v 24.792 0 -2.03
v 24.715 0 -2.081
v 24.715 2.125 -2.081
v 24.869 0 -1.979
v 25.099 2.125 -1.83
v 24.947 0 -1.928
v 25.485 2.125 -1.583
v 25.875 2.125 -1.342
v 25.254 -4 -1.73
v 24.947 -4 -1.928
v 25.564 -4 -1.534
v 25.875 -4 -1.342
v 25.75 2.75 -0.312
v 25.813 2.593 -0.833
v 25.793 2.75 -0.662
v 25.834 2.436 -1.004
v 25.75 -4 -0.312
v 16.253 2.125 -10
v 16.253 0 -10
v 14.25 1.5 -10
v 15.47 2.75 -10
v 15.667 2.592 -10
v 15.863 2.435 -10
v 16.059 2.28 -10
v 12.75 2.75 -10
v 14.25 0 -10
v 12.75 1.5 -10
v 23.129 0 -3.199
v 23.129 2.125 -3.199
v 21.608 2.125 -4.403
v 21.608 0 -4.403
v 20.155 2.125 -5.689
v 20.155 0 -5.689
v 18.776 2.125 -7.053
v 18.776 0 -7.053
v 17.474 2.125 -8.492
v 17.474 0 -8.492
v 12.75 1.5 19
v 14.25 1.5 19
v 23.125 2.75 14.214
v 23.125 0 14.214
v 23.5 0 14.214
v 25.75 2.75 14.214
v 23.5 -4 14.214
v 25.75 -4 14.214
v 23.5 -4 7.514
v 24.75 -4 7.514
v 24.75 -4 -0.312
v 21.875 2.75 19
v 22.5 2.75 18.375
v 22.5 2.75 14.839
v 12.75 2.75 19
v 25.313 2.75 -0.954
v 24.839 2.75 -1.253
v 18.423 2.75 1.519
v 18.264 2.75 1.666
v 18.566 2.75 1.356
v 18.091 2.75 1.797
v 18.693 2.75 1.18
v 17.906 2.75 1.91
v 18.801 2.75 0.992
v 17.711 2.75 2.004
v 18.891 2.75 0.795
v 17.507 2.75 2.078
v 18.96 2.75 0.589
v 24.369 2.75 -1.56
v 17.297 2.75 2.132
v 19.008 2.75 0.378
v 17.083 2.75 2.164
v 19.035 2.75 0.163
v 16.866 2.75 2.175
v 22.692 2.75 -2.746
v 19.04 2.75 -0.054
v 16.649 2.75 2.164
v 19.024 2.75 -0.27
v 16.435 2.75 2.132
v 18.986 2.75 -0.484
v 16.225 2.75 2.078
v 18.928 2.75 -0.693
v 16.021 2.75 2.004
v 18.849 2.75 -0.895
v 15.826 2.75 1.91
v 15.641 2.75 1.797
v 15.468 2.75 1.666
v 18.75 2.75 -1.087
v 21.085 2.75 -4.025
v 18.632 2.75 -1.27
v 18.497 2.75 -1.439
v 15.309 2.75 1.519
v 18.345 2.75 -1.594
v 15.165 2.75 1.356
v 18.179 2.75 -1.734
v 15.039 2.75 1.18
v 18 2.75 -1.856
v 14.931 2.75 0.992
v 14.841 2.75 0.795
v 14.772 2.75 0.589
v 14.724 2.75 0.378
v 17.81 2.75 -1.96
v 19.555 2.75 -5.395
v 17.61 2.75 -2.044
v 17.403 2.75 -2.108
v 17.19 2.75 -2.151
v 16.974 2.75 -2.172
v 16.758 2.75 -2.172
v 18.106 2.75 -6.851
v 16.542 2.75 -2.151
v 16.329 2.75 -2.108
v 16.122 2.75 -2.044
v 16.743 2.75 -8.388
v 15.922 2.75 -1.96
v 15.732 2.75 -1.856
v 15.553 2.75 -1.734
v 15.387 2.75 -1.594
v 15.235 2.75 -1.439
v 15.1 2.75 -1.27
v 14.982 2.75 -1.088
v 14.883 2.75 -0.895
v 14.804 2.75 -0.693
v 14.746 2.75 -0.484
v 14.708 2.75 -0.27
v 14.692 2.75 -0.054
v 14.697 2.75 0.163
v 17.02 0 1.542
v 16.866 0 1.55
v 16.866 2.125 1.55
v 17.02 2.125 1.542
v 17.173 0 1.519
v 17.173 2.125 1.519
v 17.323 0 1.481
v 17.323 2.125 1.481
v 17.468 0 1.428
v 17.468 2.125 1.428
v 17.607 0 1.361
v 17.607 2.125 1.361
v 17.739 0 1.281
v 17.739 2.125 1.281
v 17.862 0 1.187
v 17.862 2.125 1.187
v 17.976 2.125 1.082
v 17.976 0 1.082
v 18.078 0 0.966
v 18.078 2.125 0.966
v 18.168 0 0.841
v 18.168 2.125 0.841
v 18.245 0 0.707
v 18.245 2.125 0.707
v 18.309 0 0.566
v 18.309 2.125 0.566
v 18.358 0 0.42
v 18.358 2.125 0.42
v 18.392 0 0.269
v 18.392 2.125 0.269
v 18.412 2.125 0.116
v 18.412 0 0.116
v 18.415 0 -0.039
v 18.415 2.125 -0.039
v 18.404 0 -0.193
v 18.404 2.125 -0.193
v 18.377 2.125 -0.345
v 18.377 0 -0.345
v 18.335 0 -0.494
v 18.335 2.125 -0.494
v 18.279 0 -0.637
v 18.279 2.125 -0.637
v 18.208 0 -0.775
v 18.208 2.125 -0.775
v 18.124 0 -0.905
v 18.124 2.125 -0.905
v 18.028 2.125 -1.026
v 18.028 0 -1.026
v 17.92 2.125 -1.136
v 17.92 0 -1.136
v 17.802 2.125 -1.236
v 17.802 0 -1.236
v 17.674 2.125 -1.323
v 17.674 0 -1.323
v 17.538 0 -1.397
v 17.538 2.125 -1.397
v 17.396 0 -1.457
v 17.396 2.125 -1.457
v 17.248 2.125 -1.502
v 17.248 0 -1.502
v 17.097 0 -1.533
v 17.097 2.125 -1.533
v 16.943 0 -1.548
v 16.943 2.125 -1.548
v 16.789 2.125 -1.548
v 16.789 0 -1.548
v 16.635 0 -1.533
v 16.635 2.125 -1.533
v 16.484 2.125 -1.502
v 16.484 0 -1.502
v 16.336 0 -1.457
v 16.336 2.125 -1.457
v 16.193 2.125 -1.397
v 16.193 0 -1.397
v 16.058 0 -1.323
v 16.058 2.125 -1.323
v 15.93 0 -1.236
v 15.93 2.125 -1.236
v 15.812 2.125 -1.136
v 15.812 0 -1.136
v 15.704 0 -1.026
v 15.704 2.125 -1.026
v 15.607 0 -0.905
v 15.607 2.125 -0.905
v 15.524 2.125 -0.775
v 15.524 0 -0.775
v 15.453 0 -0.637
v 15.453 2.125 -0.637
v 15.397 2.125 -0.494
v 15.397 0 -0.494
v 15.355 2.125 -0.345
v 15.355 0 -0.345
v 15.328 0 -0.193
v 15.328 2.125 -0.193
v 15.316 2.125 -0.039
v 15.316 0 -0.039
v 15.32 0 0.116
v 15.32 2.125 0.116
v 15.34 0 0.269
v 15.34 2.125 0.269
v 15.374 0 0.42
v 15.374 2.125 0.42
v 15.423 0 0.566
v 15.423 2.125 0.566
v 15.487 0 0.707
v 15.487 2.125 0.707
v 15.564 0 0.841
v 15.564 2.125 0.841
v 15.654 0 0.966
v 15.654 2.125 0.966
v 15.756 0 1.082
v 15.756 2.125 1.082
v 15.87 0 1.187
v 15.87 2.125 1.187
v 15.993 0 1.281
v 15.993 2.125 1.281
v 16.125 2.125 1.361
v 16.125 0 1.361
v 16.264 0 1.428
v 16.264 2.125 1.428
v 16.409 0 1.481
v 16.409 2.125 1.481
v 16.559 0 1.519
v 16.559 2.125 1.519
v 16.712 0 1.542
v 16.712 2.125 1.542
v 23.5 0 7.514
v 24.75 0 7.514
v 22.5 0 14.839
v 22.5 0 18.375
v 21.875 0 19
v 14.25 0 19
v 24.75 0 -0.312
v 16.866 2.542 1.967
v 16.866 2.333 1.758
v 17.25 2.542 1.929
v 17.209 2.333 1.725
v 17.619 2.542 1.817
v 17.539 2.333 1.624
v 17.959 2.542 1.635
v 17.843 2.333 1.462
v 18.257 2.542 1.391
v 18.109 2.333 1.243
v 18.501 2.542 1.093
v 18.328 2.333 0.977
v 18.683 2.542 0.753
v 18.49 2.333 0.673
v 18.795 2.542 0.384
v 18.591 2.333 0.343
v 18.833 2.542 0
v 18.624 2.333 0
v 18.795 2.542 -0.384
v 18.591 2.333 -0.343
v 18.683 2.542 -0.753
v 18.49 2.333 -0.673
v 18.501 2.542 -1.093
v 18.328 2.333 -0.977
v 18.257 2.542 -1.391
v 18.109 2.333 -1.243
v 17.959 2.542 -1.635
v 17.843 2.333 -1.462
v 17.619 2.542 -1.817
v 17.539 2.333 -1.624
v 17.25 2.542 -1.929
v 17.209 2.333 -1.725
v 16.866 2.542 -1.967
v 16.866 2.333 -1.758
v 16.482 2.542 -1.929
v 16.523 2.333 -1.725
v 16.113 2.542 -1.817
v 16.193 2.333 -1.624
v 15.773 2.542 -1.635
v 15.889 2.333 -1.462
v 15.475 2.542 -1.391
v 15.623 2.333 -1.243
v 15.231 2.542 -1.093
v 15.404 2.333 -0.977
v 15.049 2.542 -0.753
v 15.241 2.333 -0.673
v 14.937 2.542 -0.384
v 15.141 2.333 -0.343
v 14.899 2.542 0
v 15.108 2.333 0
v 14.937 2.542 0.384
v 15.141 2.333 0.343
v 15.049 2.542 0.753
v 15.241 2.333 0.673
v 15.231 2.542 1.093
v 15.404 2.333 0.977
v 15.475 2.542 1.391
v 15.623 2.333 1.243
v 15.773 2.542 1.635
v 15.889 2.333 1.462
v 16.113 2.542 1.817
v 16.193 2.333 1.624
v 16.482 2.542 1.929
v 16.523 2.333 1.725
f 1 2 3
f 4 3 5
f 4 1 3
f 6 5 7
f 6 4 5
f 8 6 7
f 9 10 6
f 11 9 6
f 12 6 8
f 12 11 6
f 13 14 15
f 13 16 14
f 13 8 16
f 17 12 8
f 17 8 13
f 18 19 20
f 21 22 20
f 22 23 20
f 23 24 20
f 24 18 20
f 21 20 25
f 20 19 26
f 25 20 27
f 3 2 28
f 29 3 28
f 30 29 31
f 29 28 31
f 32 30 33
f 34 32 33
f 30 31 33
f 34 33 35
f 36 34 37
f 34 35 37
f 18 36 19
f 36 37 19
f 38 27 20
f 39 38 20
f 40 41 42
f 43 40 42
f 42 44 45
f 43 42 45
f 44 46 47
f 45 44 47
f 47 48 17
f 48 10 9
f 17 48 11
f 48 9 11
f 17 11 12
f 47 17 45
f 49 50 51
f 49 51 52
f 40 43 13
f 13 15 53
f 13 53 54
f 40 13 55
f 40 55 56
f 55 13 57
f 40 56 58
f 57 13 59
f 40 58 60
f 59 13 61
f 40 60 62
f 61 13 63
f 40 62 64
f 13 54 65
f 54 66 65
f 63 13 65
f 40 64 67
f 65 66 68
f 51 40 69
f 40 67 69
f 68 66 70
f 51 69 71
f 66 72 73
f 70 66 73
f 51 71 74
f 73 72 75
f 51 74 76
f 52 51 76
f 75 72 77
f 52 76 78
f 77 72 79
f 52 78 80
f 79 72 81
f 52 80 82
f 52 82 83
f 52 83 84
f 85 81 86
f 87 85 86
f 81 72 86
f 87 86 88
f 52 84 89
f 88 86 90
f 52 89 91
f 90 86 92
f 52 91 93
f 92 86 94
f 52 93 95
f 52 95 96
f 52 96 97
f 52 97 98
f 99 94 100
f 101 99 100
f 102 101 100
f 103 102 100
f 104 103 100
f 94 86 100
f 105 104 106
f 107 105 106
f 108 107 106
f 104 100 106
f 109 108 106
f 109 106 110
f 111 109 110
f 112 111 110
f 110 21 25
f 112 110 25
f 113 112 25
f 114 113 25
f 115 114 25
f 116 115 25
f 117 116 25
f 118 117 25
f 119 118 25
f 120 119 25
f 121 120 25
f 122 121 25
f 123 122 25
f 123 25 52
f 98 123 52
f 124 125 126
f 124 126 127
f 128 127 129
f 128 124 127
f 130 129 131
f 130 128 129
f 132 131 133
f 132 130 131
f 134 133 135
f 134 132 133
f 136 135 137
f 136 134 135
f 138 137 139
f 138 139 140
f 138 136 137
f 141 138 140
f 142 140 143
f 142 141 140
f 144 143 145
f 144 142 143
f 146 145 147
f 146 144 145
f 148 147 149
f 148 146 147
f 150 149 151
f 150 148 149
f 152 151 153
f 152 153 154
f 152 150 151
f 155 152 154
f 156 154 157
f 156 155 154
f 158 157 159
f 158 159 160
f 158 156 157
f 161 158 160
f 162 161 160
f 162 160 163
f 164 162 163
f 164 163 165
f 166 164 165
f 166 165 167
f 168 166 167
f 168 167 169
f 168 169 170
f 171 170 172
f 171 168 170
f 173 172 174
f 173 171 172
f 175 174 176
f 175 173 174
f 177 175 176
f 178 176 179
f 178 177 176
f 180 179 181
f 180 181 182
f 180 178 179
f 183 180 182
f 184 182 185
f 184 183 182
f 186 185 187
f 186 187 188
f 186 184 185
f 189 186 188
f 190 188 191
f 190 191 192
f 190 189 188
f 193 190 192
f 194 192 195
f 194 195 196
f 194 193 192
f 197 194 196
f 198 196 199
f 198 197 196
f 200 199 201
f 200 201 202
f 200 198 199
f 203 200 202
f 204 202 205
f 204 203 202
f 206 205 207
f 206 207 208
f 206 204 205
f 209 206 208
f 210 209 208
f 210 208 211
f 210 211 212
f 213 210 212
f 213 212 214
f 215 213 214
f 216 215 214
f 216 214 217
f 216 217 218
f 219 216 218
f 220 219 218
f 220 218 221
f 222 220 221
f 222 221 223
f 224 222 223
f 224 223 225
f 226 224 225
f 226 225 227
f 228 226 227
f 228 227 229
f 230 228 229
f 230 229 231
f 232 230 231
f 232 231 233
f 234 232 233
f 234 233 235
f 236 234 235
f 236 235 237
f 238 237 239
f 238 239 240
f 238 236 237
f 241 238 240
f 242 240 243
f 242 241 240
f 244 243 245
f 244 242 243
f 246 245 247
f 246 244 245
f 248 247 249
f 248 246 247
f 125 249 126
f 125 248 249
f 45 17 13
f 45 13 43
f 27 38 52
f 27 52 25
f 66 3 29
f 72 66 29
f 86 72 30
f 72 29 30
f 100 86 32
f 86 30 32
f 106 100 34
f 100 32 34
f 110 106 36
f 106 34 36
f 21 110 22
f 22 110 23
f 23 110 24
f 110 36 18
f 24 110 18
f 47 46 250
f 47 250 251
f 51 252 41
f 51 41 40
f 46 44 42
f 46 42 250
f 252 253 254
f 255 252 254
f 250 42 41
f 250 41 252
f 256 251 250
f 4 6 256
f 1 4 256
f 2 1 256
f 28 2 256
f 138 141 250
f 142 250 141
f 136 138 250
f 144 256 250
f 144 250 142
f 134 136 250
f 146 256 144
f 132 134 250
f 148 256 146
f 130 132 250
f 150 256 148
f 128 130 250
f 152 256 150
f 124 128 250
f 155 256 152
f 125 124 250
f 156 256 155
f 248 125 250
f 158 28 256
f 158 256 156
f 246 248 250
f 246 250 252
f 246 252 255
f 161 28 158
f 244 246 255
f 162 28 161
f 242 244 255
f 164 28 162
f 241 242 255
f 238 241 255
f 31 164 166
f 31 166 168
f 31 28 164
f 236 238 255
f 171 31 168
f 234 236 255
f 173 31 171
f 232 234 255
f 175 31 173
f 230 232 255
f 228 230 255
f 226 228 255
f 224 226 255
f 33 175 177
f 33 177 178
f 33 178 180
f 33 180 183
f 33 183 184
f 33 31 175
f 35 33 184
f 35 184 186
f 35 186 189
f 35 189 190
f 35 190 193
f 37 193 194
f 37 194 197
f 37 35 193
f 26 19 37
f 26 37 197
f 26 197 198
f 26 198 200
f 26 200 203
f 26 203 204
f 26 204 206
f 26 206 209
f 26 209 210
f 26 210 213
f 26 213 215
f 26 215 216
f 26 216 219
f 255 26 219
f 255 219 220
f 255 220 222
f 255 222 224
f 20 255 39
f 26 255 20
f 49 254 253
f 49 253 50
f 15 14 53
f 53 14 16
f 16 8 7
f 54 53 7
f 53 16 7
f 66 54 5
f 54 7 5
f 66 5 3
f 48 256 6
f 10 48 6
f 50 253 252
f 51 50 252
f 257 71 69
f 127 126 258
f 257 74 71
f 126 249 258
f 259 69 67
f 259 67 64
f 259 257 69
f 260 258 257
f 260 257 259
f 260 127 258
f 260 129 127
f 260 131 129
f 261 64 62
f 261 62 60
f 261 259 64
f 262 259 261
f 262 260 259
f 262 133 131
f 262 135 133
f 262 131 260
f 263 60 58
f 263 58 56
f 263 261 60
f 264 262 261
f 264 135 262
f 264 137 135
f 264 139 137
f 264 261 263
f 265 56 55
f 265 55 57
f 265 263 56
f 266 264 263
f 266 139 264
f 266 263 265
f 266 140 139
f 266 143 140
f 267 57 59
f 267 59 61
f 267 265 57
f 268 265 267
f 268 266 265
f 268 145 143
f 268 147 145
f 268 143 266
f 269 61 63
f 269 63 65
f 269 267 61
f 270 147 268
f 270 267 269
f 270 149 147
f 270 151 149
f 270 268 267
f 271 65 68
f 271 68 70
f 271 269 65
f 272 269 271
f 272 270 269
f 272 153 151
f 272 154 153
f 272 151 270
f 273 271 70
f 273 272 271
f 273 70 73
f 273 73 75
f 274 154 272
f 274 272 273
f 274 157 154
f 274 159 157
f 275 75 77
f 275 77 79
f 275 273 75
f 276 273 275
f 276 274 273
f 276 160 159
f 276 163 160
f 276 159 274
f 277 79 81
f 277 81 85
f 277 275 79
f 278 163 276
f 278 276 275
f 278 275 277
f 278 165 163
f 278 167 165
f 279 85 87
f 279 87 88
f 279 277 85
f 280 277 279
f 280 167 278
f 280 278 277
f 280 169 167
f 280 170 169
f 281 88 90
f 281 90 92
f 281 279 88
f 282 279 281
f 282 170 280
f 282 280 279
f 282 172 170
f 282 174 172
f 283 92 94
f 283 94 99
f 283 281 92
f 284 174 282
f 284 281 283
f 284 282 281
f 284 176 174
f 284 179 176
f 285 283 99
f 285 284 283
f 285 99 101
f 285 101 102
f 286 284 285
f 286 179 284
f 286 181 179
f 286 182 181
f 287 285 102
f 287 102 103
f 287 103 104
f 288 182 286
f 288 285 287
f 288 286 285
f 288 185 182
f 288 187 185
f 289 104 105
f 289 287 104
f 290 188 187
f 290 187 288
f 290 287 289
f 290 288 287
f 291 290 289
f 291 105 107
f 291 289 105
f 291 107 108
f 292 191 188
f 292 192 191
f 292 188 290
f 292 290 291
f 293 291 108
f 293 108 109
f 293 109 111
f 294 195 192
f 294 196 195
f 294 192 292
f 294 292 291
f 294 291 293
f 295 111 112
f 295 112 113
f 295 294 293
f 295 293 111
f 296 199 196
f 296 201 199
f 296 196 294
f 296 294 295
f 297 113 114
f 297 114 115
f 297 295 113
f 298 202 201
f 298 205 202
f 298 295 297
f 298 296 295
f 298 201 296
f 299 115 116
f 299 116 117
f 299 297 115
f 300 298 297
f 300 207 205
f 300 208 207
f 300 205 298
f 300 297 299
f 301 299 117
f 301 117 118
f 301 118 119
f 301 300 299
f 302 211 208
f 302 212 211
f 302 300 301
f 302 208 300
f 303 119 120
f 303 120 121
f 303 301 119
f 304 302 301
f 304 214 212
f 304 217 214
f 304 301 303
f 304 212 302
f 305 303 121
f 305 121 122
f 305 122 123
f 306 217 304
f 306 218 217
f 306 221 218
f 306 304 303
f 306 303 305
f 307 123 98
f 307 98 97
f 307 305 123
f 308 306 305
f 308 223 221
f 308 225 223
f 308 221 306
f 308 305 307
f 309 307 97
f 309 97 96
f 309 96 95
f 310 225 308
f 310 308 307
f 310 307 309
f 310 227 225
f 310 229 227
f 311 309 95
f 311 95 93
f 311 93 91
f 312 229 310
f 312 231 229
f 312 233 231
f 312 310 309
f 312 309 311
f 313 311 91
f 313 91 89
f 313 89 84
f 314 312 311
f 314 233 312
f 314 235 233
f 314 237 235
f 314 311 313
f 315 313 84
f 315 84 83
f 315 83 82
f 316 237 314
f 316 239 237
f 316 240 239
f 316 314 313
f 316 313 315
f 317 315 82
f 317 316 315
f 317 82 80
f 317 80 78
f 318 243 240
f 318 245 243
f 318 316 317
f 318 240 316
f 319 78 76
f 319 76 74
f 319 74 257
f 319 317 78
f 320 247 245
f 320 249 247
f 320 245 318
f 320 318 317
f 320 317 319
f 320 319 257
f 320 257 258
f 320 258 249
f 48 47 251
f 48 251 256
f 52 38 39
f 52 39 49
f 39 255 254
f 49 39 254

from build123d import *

# Parameters (mm, degrees)
SKETCH_219_R           = 1.55
EXTRUDE_1_DEPTH        = 2.75
SKETCH_940_W           = 10.000000002
SKETCH_940_H           = 4.75
EXTRUDE_2_DEPTH        = 2.75
SKETCH_1087_W          = 1
SKETCH_1087_H          = 6.95
EXTRUDE_1846_DEPTH     = 2.75
PCB_START              = -4
SKETCH_6_W             = 1
SKETCH_6_H             = 6.95
PCB_DEPTH              = 4
SKETCH_4_W             = 1.75
SKETCH_4_H             = 28.99988509
CUT_EXTRUDE_2332_DEPTH = 1.5
SKETCH_5_W             = 0.25
SKETCH_5_H             = 28.99988509
CUT_EXTRUDE_2_DEPTH    = 33.350081892
CHAMFER_1_SIZE         = 0.625
CUT_EXTRUDE_4_DEPTH    = 4


with BuildPart() as part:
    # Sketch 219 → 底座-1 (new body)
    with BuildSketch(Plane(origin=(0, 0, 0), x_dir=(1, 0, 0), z_dir=(0, 1, 0))):
        with BuildLine():
            Line((22.500000002, -14.24988509), (22.500000002, -7.263629174))
            Line((22.500000002, -7.263629174), (24.500000002, -7.263629174))
            Line((24.500000002, -7.263629174), (24.500000002, 0.312480077))
            Line((24.500000002, 0.312480077), (24.715186194, 2.08073674))
            ThreePointArc((24.715186194, 2.08073674), (20.15501929, 5.688743466), (16.252981126, 10))
            Line((16.252981126, 10), (12.5, 10))
            Line((12.5, 10), (12.5, -14.24988509))
            Line((12.5, -14.24988509), (22.500000002, -14.24988509))
        make_face()
        with Locations(Location((16.865979255, 0, 0), (0, 0, 270))):
            Circle(SKETCH_219_R, mode=Mode.SUBTRACT)
    extrude(amount=EXTRUDE_1_DEPTH)

    # Sketch 940 → 底座-2 (add)
    with BuildSketch(Plane(origin=(0, 0, 0), x_dir=(1, 0, 0), z_dir=(0, 1, 0))):
        with Locations((17.500000001, -16.62488509)):
            Rectangle(SKETCH_940_W, SKETCH_940_H)
    extrude(amount=EXTRUDE_2_DEPTH)

    # Sketch 1087 → Extrude 1846 (add)
    with BuildSketch(Plane(origin=(0, 0, 0), x_dir=(1, 0, 0), z_dir=(0, 1, 0))):
        with BuildLine():
            ThreePointArc((24.715186194, 2.08073674), (25.291636518, 1.705823535), (25.875319612, 1.342273079))
            Line((25.875319612, 1.342273079), (25.750000002, 0.312480077))
            Line((25.750000002, 0.312480077), (25.750000002, -14.213629174))
            Line((25.750000002, -14.213629174), (24.500000002, -14.213629174))
            Line((24.500000002, -14.213629174), (24.500000002, -7.263629174))
            Line((24.500000002, -7.263629174), (24.500000002, 0.312480077))
            Line((24.500000002, 0.312480077), (24.715186194, 2.08073674))
        make_face()
        with Locations((24.000000002, -10.738629174)):
            Rectangle(SKETCH_1087_W, SKETCH_1087_H)
        with Locations((23.000000002, -10.738629174)):
            Rectangle(SKETCH_1087_W, SKETCH_1087_H)
    extrude(amount=EXTRUDE_1846_DEPTH)

    # Sketch 6 → 底座卡榫-注意PCB突出部分 (add)
    with BuildSketch(Plane(origin=(0, 0, 0), x_dir=(1, 0, 0), z_dir=(0, 1, 0)).offset(PCB_START)):
        with Locations((24.000000002, -10.738629174)):
            Rectangle(SKETCH_6_W, SKETCH_6_H)
        with BuildLine():
            ThreePointArc((24.715186194, 2.08073674), (25.291636518, 1.705823535), (25.875319612, 1.342273079))
            Line((25.875319612, 1.342273079), (25.750000002, 0.312480077))
            Line((25.750000002, 0.312480077), (25.750000002, -14.213629174))
            Line((25.750000002, -14.213629174), (24.500000002, -14.213629174))
            Line((24.500000002, -14.213629174), (24.500000002, -7.263629174))
            Line((24.500000002, -7.263629174), (24.500000002, 0.312480077))
            Line((24.500000002, 0.312480077), (24.715186194, 2.08073674))
        make_face()
    extrude(amount=PCB_DEPTH)

    # 草图4 → Cut-Extrude 2332 (cut)
    with BuildSketch(Plane(origin=(0, 0, 0), x_dir=(1, 0, 0), z_dir=(0, 1, 0))):
        with Locations((13.375, -4.499942545)):
            Rectangle(SKETCH_4_W, SKETCH_4_H)
    extrude(amount=CUT_EXTRUDE_2332_DEPTH, mode=Mode.SUBTRACT)

    # 草图5 → 配合切除-2 (cut, through all)
    with BuildSketch(Plane(origin=(0, 0, 0), x_dir=(1, 0, 0), z_dir=(0, 1, 0))):
        with Locations((12.625, -4.499942545)):
            Rectangle(SKETCH_5_W, SKETCH_5_H)
    extrude(amount=CUT_EXTRUDE_2_DEPTH, mode=Mode.SUBTRACT)

    # 倒角1
    chamfer_1_edges = [part.edges().sort_by_distance(p)[0] for p in [
        (22.500000002, 1.375, 18.99988509),
        (22.500000002, 1.375, 14.213629174),
        (16.865979255, 2.75, -1.55),
        (20.661675073, 2.75, -5.223818951),
    ]]
    chamfer(chamfer_1_edges, length=CHAMFER_1_SIZE)

    # Sketch 6 2 → 切除-拉伸4 (cut)
    with BuildSketch(Plane.XZ.offset(4)):
        with BuildLine():
            Line((24.715186194, -2.08073674), (24.500000002, -0.312480077))
            Line((24.500000002, -0.312480077), (24.500000002, 7.263629174))
            Line((24.500000002, 7.263629174), (23.500000002, 7.263629174))
            Line((23.500000002, 7.263629174), (23.500000002, 7.513629174))
            Line((23.500000002, 7.513629174), (24.750000002, 7.513629174))
            Line((24.750000002, 7.513629174), (24.750000002, -0.312480077))
            Line((24.750000002, -0.312480077), (24.946632534, -1.928275128))
            ThreePointArc((24.946632534, -1.928275128), (24.830758909, -2.004277534), (24.715186194, -2.08073674))
        make_face()
    extrude(amount=-CUT_EXTRUDE_4_DEPTH, mode=Mode.SUBTRACT)


solid = part.part
